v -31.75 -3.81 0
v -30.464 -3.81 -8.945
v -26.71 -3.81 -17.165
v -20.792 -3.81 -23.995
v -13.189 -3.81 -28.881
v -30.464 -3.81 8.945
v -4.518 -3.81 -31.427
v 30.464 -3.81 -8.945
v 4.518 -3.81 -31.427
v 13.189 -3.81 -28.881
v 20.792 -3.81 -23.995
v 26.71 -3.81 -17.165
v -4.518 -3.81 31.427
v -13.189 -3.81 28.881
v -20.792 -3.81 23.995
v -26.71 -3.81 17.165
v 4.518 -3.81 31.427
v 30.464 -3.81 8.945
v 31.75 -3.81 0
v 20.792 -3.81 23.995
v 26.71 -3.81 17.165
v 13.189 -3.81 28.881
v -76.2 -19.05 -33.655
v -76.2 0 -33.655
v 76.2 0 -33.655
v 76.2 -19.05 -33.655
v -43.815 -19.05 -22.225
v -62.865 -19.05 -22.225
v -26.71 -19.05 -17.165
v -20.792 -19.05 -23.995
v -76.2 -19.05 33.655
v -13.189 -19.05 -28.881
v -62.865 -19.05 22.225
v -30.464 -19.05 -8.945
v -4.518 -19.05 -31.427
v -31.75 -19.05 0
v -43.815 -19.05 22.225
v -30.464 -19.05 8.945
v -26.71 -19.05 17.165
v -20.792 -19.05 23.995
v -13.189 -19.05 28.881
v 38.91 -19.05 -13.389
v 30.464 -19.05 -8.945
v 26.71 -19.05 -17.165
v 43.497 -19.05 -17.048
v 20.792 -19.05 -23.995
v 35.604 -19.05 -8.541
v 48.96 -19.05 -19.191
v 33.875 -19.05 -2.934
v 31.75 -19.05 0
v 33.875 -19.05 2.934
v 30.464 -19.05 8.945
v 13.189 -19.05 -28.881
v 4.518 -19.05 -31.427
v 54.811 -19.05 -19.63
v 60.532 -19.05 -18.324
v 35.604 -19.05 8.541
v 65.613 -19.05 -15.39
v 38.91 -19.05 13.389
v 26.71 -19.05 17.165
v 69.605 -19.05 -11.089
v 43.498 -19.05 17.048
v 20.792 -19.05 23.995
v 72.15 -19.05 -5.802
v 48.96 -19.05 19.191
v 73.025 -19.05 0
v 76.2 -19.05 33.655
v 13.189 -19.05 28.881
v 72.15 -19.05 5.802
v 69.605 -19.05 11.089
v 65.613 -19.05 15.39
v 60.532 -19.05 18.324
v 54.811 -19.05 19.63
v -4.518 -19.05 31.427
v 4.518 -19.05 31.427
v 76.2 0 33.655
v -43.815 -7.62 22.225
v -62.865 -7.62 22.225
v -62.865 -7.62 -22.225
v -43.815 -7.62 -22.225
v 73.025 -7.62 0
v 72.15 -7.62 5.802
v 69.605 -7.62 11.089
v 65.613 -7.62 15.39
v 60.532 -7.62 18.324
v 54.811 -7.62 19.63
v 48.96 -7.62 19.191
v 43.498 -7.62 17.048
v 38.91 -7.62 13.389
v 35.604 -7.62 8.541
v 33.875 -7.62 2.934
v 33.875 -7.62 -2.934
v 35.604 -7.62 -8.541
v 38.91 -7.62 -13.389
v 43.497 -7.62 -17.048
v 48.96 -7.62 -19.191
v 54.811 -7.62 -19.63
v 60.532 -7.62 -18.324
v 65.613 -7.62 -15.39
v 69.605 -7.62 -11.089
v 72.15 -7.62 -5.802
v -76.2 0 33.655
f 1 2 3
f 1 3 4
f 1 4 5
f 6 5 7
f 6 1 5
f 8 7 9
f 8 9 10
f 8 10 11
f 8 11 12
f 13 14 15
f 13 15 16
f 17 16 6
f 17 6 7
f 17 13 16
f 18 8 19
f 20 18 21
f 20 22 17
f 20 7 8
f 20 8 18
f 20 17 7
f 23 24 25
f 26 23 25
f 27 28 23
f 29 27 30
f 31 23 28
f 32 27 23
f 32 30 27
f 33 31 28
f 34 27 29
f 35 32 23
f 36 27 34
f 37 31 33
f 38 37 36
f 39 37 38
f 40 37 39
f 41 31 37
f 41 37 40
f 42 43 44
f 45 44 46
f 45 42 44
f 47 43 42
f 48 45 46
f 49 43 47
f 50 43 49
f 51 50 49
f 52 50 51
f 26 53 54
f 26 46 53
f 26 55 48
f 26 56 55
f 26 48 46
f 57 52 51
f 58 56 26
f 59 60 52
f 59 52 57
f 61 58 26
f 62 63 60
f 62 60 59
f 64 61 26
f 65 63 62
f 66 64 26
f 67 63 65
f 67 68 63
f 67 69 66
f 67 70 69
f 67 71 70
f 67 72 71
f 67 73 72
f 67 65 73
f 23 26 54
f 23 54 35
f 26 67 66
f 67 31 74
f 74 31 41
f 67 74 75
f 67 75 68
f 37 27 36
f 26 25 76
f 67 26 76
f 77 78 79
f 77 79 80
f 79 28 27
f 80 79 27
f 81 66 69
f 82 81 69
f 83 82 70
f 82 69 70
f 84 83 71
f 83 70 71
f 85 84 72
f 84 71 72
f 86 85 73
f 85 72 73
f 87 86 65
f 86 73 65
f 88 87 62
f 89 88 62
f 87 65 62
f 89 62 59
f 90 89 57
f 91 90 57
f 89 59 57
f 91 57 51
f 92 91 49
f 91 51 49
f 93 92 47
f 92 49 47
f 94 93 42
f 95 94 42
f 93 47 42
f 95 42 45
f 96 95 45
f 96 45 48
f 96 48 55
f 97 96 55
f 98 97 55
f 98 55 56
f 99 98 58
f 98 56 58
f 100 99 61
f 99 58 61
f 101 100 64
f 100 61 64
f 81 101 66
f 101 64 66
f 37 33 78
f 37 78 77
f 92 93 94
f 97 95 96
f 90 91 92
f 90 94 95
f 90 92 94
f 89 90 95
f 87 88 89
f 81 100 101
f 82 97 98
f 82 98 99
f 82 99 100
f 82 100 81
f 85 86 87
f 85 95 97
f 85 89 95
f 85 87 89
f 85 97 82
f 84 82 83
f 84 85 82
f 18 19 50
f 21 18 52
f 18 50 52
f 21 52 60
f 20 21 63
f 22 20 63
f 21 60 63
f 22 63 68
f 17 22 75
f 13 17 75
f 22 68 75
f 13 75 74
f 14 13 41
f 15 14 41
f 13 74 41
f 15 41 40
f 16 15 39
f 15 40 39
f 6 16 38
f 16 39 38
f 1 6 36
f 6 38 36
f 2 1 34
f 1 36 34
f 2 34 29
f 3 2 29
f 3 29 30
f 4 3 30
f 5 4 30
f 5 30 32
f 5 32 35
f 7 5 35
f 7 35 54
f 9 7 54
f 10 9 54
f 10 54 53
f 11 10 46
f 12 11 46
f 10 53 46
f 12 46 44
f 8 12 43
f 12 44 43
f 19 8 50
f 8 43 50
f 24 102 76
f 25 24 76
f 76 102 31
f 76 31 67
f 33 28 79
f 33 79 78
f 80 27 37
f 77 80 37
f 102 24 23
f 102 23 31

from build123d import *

# Parameters (mm, degrees)
F0_W     = 152.4
F0_H     = 67.31
F1_DEPTH = 19.05
F2_R     = 31.75
F3_DEPTH = 15.24
F4_R     = 19.685
F5_DEPTH = 11.43
F6_W     = 19.05
F6_H     = 44.45
F7_DEPTH = 11.43


with BuildPart() as f1:
    # F0 (on Front) → F1 (new body)
    with BuildSketch(Plane.XZ):
        Rectangle(F0_W, F0_H)
    extrude(amount=F1_DEPTH)

    # F2 (on face) → F3 (cut)
    with BuildSketch(Plane.XZ.offset(19.05)):
        Circle(F2_R)
    extrude(amount=-F3_DEPTH, mode=Mode.SUBTRACT)

    # F4 (on face) → F5 (cut)
    with BuildSketch(Plane.XZ.offset(19.05)):
        with Locations((53.34, 0)):
            Circle(F4_R)
    extrude(amount=-F5_DEPTH, mode=Mode.SUBTRACT)

    # F6 (on face) → F7 (cut)
    with BuildSketch(Plane.XZ.offset(19.05)):
        with Locations((-53.34, 0)):
            Rectangle(F6_W, F6_H)
    extrude(amount=-F7_DEPTH, mode=Mode.SUBTRACT)


solid = f1.part
